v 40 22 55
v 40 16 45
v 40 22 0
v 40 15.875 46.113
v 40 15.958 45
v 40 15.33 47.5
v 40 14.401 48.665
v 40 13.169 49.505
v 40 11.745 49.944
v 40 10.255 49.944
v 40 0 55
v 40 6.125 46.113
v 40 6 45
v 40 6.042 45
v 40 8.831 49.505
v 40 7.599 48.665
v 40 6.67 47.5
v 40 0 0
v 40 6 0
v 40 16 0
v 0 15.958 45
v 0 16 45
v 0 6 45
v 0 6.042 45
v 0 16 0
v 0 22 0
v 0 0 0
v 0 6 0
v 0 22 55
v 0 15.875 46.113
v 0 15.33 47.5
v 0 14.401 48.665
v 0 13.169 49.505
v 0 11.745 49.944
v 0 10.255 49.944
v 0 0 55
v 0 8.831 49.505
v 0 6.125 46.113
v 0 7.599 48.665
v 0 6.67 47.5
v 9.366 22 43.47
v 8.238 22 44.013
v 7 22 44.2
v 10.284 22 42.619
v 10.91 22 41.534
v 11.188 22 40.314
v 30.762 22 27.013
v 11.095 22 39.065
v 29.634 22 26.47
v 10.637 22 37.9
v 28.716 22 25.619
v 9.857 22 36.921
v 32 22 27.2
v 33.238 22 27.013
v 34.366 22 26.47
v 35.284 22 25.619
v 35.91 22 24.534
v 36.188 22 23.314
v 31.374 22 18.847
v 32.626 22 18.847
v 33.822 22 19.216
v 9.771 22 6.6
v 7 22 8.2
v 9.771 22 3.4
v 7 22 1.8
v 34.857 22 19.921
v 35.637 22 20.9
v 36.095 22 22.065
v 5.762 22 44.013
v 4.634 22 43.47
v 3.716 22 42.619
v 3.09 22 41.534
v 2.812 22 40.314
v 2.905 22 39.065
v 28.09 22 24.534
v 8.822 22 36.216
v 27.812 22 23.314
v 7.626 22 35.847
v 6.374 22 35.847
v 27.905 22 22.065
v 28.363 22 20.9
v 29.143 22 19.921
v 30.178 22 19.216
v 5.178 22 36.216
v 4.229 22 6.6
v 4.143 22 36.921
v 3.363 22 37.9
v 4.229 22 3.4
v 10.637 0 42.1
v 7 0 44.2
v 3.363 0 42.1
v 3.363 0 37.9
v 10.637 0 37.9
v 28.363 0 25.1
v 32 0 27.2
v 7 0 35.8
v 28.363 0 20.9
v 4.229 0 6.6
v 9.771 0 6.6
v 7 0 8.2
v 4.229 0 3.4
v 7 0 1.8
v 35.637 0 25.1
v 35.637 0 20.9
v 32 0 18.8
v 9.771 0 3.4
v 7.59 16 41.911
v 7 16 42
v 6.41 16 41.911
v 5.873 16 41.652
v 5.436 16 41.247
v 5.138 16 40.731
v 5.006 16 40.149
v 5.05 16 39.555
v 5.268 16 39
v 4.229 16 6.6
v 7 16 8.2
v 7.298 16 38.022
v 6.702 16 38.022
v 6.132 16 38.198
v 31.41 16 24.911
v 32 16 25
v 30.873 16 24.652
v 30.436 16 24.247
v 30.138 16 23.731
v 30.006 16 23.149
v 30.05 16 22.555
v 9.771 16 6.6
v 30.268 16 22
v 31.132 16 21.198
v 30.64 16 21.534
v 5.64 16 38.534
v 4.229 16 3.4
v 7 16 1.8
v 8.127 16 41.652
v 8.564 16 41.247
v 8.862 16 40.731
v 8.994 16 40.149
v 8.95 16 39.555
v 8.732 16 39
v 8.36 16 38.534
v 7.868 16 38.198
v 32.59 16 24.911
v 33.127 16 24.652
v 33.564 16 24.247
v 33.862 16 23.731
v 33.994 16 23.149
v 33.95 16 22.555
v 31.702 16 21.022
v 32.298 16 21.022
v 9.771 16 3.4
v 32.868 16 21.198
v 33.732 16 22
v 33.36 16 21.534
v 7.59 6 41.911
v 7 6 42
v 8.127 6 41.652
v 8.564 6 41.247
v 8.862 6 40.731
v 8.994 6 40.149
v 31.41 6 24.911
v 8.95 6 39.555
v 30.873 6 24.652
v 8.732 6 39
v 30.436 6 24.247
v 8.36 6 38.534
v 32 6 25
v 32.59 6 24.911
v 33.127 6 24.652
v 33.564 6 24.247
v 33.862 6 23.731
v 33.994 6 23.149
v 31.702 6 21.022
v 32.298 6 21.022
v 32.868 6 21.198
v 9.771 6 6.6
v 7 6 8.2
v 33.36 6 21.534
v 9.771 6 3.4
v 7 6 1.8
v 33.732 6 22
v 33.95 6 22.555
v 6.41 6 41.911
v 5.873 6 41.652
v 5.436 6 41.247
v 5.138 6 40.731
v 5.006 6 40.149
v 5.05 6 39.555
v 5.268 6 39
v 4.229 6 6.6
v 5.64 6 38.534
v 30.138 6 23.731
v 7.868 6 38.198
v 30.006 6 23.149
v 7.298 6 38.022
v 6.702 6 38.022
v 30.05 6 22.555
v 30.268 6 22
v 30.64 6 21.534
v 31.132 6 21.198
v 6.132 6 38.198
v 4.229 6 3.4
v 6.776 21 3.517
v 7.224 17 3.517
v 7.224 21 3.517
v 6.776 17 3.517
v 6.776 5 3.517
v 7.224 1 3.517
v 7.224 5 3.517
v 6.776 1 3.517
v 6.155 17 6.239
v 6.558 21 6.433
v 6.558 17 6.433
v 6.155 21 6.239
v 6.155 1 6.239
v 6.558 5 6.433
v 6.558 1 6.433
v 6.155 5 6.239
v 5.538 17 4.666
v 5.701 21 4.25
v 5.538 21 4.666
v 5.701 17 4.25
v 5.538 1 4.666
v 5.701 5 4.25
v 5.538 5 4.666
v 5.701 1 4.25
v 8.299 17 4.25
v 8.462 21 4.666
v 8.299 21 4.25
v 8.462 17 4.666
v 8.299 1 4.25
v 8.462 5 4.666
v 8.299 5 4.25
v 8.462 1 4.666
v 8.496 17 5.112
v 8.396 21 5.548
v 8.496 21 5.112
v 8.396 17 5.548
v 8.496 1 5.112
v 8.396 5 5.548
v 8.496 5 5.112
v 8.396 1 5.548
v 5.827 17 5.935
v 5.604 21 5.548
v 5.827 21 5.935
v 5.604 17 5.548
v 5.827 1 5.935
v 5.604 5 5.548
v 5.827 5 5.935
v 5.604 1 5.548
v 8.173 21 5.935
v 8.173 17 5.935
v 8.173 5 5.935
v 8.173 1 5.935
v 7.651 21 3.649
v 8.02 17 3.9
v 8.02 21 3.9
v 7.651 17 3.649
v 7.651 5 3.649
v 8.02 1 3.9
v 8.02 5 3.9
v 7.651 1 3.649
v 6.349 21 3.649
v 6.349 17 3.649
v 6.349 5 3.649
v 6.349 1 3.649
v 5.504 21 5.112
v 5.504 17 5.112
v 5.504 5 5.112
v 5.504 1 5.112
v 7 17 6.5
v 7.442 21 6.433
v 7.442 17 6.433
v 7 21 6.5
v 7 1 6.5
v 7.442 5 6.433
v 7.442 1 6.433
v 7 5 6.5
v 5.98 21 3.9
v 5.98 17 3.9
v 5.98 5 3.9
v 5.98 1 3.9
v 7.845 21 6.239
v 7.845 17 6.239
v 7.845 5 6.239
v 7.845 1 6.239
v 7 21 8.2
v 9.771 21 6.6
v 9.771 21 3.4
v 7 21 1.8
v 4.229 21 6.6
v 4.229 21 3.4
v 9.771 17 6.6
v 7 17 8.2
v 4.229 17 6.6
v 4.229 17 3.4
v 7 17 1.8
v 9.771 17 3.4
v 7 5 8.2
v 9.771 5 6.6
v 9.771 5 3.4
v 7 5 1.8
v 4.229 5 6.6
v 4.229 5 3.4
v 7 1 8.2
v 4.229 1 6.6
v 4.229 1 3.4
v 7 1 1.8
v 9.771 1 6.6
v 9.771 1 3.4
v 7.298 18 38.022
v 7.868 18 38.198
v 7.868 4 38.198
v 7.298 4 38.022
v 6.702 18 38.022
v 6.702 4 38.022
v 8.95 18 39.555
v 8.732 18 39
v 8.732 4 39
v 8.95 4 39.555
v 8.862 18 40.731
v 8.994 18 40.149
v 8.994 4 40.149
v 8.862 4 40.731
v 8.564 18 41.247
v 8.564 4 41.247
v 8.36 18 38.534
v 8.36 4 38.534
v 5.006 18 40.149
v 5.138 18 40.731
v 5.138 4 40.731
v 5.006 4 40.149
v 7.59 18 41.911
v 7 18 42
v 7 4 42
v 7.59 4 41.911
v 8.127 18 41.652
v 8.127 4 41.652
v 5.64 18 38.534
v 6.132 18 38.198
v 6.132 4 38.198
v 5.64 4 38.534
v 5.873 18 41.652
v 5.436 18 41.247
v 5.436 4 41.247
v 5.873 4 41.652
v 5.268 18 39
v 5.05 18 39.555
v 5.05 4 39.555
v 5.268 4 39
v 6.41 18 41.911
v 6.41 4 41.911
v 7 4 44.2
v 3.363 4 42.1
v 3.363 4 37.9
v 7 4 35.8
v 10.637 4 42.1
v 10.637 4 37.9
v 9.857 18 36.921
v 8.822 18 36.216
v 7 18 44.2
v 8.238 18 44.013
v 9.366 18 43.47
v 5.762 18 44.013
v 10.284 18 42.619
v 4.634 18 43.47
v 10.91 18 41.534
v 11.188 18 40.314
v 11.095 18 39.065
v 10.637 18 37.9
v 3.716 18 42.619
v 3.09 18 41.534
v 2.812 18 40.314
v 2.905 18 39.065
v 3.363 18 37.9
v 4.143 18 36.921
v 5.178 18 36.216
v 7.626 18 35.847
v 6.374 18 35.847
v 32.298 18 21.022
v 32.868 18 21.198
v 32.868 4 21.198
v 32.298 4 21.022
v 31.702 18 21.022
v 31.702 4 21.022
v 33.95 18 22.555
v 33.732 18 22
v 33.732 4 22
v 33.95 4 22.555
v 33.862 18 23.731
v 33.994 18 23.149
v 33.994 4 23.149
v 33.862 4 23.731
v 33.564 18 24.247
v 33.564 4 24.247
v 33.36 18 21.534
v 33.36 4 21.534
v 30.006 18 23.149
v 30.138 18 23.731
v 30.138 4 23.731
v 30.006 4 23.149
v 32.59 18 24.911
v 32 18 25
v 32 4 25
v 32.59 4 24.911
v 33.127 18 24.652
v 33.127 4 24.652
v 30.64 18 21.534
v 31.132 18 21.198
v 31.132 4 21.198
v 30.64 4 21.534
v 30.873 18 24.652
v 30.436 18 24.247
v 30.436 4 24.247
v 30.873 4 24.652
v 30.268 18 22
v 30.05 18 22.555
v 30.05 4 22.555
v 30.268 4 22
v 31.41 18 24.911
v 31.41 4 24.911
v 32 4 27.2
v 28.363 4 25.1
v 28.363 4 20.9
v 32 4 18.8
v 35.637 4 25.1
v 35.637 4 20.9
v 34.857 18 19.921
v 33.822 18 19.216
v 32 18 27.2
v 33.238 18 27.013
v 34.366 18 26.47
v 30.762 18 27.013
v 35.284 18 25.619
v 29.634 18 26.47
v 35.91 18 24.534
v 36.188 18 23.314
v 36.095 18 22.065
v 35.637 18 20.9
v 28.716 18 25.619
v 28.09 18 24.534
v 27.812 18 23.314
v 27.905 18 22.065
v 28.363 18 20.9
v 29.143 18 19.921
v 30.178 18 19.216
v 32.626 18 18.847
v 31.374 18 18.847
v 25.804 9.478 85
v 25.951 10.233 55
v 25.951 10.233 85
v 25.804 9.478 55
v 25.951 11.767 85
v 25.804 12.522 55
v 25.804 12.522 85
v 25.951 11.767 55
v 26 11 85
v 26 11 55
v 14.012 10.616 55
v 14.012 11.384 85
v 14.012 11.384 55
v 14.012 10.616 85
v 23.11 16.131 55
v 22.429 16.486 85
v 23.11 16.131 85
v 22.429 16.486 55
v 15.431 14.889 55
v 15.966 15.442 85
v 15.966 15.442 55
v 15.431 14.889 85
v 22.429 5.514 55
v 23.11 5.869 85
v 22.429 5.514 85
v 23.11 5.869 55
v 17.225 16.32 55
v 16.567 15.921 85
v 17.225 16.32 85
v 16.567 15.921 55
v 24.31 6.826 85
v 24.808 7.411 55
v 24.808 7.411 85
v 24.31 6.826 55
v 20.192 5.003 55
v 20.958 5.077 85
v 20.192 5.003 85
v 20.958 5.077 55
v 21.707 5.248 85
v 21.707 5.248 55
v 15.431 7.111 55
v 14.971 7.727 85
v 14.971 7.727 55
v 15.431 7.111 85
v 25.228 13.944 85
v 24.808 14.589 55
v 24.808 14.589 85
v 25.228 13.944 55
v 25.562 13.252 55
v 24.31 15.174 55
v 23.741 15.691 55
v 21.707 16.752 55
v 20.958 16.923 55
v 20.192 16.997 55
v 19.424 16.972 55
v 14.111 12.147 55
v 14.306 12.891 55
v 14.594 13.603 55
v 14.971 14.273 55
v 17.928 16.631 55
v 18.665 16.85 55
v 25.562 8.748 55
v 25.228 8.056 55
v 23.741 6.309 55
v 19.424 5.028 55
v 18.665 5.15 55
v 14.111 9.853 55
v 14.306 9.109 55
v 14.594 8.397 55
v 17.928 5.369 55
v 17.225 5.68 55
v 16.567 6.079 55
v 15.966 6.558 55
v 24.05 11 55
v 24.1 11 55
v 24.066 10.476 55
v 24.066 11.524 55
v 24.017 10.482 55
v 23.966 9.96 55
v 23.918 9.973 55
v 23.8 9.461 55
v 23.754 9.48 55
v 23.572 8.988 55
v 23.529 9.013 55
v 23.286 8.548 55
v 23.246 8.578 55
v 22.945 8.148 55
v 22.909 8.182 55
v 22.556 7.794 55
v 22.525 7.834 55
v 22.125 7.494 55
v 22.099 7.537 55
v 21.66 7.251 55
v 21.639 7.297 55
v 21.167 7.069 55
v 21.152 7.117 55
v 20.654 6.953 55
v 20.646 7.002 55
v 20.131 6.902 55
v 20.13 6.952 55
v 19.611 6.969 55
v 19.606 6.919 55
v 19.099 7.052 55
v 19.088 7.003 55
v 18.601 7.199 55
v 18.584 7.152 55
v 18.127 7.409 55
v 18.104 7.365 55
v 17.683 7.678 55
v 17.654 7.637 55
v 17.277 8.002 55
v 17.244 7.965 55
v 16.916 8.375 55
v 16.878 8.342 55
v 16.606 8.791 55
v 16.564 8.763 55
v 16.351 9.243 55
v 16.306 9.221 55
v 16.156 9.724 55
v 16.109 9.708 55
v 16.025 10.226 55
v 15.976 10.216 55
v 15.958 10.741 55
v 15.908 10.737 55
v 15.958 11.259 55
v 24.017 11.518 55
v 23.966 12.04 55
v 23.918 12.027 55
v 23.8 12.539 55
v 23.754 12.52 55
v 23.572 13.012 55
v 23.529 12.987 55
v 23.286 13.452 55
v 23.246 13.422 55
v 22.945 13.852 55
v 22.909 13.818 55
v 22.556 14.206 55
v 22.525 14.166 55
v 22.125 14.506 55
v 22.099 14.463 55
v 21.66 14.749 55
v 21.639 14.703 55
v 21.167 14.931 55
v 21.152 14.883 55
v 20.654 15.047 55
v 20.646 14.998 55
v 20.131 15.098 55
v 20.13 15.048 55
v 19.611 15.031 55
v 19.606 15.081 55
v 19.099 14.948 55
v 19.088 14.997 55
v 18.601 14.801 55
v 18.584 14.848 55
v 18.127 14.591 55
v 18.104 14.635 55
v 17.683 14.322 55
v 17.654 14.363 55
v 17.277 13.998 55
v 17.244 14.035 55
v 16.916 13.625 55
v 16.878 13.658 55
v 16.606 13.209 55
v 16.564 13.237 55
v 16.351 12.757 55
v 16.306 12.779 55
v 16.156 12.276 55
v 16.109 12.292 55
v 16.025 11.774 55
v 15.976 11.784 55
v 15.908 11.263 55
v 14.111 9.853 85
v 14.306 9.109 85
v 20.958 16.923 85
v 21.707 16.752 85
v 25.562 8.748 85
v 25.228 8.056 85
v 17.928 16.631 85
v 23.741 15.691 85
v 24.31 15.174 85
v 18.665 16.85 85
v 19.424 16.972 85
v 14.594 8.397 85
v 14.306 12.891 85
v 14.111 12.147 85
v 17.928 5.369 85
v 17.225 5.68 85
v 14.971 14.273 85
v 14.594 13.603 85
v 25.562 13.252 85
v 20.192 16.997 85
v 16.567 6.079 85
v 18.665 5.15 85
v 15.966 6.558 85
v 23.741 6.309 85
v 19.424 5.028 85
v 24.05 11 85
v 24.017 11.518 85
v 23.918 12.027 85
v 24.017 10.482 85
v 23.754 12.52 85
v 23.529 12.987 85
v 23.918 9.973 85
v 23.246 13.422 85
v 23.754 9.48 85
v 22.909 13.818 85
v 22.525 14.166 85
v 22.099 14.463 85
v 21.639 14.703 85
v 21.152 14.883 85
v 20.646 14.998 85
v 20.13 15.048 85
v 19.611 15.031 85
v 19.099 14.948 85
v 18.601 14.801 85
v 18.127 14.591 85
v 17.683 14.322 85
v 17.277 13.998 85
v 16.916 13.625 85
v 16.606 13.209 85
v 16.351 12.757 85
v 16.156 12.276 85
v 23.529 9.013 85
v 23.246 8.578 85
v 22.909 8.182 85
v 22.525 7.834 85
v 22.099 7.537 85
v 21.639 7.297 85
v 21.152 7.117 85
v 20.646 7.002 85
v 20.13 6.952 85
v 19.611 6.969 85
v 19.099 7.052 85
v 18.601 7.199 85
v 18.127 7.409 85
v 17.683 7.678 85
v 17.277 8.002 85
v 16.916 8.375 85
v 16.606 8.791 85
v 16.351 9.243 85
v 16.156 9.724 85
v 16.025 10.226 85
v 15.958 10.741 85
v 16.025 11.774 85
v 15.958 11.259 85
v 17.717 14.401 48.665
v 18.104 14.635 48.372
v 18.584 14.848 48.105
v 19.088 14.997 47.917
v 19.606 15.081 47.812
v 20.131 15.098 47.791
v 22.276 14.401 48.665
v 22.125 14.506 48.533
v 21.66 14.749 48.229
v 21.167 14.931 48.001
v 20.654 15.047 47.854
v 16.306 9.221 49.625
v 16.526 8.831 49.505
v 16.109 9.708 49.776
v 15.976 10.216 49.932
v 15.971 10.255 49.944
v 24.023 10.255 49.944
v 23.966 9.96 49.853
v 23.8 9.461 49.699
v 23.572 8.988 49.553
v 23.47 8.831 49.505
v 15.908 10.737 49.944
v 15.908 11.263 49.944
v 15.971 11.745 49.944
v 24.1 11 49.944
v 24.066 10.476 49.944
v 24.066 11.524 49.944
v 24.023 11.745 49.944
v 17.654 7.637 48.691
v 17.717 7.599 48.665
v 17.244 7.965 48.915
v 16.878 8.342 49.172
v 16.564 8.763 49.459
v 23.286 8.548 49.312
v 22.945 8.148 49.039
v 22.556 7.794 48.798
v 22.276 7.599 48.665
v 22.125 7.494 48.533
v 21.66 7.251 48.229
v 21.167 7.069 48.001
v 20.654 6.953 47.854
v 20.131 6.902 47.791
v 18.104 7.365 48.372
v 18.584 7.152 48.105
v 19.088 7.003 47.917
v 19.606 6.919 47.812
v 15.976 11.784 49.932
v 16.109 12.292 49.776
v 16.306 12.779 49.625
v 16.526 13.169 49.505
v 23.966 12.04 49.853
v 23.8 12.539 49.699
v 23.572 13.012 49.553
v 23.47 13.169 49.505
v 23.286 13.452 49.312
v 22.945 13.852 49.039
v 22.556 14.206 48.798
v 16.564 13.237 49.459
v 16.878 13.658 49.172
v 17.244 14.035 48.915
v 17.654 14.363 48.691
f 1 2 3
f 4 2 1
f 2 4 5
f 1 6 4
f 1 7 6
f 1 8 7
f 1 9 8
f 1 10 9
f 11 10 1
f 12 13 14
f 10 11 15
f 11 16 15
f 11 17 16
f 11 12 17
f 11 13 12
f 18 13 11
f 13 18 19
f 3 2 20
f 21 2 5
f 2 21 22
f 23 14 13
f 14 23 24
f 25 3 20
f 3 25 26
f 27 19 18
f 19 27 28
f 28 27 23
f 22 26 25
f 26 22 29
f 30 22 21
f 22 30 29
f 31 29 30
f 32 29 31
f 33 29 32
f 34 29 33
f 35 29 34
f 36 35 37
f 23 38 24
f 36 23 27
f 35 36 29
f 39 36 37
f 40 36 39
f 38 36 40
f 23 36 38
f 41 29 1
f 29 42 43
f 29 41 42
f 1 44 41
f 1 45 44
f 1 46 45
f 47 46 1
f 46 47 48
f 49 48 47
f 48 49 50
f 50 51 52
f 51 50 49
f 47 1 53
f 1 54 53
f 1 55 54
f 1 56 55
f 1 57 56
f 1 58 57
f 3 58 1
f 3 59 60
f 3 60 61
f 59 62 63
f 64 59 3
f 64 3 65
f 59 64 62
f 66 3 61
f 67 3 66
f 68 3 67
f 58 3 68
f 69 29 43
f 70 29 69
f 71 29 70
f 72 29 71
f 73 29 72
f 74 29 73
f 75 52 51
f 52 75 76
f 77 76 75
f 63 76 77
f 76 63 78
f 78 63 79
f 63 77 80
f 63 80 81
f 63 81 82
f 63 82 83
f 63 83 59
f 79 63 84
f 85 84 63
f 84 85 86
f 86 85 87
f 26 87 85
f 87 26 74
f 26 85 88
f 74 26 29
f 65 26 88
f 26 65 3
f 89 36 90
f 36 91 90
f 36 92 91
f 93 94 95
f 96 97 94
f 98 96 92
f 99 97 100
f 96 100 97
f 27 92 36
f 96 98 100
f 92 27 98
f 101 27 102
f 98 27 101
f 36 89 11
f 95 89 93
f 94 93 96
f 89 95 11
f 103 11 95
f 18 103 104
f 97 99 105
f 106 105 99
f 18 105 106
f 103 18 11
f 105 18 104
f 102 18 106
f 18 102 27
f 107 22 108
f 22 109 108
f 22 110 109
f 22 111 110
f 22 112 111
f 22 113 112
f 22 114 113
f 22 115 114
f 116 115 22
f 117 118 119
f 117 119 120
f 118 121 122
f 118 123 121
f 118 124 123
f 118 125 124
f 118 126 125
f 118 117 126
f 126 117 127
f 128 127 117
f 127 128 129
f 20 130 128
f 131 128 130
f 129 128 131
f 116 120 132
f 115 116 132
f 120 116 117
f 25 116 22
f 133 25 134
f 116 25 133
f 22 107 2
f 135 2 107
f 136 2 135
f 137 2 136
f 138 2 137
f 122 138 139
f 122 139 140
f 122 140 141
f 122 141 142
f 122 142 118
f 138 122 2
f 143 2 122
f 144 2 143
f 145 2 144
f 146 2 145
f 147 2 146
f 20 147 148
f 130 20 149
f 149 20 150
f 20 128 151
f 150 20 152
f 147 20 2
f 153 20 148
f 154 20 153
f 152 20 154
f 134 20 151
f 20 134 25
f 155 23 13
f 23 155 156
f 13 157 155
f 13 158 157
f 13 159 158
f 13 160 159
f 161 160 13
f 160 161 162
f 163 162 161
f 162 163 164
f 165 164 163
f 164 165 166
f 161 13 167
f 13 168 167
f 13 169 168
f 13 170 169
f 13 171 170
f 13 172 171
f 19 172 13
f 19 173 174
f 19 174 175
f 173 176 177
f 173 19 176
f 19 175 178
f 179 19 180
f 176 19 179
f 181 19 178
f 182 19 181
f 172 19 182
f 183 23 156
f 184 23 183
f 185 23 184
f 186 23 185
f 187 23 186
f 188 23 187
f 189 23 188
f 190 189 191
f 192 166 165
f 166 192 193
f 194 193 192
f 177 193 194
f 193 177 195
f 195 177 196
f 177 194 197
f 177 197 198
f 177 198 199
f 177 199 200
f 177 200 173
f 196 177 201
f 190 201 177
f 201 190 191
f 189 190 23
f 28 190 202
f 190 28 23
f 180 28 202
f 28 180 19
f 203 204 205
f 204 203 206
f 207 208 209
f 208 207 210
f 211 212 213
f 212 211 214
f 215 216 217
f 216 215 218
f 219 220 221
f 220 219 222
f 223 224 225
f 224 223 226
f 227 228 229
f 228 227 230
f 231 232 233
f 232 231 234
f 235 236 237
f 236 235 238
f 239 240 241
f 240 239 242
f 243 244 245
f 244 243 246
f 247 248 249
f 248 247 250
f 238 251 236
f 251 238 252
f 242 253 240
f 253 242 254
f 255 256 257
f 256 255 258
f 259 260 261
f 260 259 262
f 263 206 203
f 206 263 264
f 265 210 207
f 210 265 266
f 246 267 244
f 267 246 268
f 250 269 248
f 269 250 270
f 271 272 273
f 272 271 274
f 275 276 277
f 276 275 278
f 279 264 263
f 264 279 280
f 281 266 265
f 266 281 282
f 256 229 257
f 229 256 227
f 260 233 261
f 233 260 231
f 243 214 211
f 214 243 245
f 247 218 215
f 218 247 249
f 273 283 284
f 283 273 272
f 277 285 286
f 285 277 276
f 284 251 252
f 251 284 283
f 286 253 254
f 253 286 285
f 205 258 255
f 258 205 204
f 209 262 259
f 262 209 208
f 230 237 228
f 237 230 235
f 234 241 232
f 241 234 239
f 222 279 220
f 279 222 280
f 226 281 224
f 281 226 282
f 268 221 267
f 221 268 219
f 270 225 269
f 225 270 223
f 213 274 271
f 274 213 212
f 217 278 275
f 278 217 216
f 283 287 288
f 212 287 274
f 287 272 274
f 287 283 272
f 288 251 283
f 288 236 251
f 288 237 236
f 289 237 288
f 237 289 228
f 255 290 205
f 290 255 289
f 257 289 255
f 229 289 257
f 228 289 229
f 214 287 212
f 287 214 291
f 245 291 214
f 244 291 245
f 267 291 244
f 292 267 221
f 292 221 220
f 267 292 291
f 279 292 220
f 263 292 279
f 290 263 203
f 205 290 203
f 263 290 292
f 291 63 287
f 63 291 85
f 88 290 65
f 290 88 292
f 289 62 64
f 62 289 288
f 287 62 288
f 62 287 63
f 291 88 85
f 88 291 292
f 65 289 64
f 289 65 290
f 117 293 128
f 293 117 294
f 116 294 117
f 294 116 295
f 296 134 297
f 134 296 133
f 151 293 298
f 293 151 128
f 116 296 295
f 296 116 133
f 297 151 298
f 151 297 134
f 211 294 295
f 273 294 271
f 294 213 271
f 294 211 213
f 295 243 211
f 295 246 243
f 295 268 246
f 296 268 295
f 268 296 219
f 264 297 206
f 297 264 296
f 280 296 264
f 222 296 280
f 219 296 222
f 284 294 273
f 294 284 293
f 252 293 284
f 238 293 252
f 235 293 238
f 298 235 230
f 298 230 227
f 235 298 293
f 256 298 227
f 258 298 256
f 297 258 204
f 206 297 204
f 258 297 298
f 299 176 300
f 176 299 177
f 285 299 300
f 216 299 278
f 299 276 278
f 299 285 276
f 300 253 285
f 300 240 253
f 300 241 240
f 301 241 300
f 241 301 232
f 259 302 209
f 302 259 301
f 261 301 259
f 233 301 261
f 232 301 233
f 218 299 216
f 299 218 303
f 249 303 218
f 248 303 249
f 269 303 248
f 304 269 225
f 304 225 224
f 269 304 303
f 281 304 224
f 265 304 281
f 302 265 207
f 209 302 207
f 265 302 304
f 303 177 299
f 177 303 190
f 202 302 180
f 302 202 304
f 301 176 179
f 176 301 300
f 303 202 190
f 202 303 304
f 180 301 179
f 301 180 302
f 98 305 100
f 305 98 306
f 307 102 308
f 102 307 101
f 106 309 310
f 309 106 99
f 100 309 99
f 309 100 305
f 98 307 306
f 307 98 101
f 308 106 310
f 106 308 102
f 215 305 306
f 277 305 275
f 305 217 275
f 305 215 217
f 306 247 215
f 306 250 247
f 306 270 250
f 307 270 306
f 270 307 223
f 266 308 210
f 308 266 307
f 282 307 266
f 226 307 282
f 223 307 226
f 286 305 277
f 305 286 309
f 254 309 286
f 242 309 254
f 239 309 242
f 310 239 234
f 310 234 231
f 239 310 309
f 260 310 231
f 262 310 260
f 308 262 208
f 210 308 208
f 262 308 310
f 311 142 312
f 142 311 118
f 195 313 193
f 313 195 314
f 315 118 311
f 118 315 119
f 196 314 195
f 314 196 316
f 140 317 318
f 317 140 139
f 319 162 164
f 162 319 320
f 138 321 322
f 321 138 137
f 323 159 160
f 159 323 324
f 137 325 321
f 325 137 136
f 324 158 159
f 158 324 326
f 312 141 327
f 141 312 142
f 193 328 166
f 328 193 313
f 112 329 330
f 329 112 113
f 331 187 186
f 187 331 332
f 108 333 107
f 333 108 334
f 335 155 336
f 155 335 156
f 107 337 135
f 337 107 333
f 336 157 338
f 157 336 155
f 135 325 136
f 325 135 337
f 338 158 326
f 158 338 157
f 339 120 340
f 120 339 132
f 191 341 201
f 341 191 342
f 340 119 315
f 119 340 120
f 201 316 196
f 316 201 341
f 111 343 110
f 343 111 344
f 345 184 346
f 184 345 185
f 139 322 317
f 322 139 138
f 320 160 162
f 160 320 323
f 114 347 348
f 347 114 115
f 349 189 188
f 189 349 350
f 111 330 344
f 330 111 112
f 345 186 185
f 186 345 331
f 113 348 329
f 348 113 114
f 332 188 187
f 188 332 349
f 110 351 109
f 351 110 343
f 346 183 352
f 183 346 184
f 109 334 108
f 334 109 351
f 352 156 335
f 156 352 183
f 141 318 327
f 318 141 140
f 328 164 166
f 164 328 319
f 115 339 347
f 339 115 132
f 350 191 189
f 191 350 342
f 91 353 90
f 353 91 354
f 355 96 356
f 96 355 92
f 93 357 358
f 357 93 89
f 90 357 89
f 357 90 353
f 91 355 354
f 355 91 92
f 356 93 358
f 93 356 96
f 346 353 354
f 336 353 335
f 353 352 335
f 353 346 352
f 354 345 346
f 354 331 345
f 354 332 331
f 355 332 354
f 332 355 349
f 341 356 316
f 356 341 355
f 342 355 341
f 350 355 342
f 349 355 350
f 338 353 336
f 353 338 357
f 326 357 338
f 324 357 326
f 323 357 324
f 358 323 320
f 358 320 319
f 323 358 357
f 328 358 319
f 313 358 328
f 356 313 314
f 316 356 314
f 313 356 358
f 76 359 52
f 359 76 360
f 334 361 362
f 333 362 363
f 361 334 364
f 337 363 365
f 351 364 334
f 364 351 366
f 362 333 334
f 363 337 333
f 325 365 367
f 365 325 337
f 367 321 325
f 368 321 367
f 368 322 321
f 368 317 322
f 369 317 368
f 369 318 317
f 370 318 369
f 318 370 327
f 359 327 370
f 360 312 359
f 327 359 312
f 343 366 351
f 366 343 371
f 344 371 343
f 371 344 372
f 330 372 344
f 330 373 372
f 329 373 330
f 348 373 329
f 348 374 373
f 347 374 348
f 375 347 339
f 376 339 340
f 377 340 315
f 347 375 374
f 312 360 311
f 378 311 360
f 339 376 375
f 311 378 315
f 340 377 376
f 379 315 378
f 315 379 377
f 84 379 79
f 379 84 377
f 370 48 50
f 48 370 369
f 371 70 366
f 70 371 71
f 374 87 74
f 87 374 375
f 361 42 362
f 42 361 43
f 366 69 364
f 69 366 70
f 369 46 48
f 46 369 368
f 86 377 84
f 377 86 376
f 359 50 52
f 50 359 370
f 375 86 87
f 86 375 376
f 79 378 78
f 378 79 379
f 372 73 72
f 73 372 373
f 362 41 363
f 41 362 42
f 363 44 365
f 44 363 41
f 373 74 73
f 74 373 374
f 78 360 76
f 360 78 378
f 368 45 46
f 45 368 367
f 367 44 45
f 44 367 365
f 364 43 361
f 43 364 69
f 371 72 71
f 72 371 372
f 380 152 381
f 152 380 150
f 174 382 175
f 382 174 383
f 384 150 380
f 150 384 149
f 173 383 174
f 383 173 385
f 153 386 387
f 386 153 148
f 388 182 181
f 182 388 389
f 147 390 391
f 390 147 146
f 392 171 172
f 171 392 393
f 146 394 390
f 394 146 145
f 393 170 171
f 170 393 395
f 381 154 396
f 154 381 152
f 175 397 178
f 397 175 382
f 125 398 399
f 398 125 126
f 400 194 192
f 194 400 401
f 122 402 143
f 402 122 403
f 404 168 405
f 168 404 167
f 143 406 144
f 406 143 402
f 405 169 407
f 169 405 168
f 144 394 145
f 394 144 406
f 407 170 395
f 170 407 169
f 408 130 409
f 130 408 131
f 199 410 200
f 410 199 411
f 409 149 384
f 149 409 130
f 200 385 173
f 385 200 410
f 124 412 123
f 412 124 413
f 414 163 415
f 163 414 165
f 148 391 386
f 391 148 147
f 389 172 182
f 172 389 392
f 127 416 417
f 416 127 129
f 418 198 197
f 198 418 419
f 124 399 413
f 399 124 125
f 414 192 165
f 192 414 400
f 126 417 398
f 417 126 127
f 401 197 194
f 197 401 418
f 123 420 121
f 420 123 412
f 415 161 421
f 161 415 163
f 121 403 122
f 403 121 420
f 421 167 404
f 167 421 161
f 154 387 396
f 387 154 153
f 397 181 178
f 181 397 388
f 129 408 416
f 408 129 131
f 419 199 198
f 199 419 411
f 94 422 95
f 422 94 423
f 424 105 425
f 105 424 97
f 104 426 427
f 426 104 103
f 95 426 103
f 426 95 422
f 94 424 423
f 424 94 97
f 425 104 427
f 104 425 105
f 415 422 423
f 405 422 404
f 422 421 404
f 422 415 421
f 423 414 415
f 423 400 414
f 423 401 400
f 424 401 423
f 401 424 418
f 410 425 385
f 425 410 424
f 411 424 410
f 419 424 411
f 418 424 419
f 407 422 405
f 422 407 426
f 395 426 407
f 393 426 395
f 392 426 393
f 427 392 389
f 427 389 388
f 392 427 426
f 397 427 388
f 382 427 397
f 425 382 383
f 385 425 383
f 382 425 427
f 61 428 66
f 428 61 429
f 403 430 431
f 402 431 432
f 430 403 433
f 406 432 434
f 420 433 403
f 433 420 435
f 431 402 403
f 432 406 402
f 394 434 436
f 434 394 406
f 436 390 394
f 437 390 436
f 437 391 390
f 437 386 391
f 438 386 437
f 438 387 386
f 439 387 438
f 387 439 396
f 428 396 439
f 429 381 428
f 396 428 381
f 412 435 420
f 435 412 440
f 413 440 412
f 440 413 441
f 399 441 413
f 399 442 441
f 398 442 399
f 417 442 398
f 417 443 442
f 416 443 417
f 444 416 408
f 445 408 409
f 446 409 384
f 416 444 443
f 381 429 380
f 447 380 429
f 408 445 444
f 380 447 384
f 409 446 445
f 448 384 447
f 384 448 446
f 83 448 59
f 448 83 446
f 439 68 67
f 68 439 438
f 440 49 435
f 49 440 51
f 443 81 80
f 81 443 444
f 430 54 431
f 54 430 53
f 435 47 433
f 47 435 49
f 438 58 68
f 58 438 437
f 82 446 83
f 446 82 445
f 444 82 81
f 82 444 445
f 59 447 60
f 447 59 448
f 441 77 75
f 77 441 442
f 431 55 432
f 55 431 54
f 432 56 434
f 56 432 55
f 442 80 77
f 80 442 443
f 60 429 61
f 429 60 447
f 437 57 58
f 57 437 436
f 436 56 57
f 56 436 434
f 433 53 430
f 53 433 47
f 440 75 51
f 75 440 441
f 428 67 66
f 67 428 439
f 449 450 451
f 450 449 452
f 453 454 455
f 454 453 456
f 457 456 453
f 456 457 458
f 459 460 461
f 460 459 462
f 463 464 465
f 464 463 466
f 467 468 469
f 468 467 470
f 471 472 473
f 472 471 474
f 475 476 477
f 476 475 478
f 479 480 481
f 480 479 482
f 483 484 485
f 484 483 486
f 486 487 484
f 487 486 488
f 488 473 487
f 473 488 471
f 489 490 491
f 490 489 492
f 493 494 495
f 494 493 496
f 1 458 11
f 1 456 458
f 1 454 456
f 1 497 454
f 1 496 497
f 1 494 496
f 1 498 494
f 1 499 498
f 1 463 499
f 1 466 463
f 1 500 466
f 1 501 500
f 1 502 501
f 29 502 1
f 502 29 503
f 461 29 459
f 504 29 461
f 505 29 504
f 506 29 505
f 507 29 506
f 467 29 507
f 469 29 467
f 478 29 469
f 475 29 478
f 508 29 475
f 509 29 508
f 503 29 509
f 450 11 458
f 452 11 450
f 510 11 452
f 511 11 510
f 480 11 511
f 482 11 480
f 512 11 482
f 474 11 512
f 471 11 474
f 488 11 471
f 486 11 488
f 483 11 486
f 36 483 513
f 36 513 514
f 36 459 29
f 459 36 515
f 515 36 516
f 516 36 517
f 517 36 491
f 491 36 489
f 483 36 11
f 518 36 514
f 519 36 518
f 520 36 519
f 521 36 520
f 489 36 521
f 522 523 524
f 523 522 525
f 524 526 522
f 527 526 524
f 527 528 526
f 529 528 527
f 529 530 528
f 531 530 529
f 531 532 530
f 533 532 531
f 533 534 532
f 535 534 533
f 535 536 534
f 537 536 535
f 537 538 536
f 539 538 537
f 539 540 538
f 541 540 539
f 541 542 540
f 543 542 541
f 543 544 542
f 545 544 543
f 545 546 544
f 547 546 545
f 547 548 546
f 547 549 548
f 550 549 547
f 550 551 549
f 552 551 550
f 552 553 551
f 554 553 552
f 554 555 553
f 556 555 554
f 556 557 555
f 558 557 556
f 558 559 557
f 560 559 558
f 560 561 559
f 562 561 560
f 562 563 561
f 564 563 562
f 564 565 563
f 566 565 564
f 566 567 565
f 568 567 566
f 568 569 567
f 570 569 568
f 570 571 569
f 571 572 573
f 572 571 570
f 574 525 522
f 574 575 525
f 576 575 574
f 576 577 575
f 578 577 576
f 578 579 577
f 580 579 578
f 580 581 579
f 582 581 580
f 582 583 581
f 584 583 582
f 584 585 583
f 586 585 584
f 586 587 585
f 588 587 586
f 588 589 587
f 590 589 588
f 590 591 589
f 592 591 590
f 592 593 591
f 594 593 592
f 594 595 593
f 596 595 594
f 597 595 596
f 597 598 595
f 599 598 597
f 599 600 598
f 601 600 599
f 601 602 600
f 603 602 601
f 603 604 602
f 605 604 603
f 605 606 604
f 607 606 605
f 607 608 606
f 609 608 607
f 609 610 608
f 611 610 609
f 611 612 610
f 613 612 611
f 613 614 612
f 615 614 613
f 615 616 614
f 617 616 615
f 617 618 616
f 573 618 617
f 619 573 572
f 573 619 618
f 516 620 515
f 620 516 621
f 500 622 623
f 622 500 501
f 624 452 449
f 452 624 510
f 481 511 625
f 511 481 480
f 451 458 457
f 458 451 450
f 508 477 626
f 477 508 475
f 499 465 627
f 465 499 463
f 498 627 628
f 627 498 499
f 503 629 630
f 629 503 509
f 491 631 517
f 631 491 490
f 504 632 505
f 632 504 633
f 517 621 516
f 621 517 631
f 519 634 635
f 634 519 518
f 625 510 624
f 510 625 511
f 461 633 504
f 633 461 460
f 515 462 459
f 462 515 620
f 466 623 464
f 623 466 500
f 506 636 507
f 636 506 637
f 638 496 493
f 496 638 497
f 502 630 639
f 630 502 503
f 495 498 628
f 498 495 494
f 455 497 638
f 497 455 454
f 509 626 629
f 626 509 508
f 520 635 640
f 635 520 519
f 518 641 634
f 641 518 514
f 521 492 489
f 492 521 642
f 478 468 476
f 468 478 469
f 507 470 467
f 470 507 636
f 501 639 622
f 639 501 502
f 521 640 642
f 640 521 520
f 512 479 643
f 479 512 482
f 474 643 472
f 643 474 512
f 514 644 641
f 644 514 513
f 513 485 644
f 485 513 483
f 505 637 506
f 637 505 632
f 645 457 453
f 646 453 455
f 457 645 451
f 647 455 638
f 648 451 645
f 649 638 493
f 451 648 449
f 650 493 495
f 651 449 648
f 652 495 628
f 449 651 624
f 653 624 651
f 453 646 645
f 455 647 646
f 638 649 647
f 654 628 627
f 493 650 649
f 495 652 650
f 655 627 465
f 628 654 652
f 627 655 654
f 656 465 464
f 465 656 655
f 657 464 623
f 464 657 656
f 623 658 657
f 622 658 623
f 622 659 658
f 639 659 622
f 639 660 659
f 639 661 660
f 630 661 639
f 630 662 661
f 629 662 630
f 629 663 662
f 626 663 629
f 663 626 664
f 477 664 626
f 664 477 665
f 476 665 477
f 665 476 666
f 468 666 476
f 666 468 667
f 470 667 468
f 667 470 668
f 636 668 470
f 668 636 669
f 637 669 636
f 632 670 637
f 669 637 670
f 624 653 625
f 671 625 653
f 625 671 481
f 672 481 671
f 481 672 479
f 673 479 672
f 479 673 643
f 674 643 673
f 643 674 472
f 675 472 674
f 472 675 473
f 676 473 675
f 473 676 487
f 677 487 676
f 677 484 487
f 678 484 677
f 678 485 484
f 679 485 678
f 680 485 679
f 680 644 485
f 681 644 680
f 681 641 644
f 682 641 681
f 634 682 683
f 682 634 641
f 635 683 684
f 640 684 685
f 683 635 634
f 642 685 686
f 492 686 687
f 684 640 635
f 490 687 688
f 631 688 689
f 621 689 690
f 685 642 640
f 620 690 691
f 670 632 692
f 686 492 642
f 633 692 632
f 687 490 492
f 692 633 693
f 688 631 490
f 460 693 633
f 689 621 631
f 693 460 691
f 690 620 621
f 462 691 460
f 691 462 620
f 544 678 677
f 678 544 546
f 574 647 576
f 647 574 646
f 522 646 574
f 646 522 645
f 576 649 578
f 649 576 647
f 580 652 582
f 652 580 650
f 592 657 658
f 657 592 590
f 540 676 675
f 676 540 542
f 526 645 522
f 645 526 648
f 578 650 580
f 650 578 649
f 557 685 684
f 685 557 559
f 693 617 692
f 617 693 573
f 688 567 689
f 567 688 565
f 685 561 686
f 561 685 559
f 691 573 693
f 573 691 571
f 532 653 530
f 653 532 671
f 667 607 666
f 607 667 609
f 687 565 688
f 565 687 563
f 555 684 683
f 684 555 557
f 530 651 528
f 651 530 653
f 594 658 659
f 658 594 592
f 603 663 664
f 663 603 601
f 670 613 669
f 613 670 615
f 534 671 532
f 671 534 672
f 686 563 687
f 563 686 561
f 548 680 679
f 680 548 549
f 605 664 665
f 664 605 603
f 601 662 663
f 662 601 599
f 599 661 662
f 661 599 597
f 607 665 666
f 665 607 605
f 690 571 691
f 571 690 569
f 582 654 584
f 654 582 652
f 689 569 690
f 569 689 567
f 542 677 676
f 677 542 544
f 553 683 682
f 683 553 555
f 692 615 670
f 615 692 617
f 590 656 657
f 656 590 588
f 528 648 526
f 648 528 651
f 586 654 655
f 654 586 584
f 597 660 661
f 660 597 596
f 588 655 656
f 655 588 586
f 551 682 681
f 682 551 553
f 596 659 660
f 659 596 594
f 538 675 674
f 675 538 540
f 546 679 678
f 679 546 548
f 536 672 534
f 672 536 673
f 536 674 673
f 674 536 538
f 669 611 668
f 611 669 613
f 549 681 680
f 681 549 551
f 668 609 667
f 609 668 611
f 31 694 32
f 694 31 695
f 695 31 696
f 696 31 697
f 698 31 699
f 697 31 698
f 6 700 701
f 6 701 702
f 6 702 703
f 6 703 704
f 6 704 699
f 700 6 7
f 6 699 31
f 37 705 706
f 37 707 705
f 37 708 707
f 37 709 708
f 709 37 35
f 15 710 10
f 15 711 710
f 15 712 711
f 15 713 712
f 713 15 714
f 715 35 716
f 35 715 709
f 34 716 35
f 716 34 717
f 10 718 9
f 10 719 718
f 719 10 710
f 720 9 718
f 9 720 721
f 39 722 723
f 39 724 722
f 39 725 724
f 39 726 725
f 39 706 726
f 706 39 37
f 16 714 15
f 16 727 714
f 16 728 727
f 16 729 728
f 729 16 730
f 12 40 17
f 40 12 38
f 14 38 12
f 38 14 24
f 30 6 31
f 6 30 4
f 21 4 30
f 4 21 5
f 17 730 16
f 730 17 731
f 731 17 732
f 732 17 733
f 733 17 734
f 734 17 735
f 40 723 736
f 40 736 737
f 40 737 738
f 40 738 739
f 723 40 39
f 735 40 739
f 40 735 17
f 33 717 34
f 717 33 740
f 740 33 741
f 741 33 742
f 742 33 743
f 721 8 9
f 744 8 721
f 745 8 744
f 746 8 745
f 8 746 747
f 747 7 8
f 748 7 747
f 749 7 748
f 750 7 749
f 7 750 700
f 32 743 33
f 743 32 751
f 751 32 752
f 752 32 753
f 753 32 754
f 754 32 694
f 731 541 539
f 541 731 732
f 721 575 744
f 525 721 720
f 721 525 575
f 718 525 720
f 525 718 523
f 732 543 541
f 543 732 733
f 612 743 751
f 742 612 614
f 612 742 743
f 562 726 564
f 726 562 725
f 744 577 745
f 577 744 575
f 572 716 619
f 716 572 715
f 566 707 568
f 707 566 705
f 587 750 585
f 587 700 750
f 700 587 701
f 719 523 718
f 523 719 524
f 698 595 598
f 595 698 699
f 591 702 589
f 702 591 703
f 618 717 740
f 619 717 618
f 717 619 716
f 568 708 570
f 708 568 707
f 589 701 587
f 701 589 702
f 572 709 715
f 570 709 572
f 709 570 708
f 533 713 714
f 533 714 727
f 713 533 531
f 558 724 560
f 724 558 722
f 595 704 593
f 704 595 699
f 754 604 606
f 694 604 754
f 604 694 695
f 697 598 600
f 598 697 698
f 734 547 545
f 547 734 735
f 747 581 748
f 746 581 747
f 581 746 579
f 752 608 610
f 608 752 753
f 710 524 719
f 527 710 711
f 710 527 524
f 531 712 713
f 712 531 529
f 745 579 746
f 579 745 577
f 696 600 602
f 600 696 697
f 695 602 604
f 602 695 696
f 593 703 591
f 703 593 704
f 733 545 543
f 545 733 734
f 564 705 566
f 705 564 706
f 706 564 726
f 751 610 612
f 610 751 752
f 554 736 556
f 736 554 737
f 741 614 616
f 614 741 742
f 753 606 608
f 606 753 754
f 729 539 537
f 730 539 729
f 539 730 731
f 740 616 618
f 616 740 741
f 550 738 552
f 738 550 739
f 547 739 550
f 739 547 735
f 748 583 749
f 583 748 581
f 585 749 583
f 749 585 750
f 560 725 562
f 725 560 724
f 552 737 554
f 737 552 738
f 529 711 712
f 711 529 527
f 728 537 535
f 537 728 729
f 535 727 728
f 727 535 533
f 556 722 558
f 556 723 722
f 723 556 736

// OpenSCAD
union()
{
	difference()
	{
		cube([40,22,45]);
		translate([0,6,0])
		cube([40,22-12,45]);
		translate([7,22+6,5])
		rotate([90,30,0])
		cylinder(d=3,h=34,$fn=21);
	
		translate([7,22,5])
		rotate([90,30,0])
		cylinder(d=6.4,h=1,$fn=6);
	
		translate([7,17,5])
		rotate([90,30,0])
		cylinder(d=6.4,h=1,$fn=6);
	
		translate([7,6,5])
		rotate([90,30,0])
		cylinder(d=6.4,h=1,$fn=6);
	
		translate([7,1,5])
		rotate([90,30,0])
		cylinder(d=6.4,h=1,$fn=6);
	
		// --------
		
		translate([7,22,40])
		rotate([90,30,0])
		cylinder(d=4,h=34,$fn=21);
	
		translate([7,4,40])
		rotate([90,30,0])
		cylinder(d=8.4,h=4,$fn=6);
	
		translate([7,22,40])
		rotate([90,30,0])
		cylinder(d=8.4,h=4,$fn=21);
	
		// --------
		
		translate([32,22,23])
		rotate([90,30,0])
		cylinder(d=4,h=34,$fn=21);
	
		translate([32,4,23])
		rotate([90,30,0])
		cylinder(d=8.4,h=4,$fn=6);
	
		translate([32,22,23])
		rotate([90,30,0])
		cylinder(d=8.4,h=4,$fn=21);
	}
	
	difference()
	{
		translate([20,11,55])
		cylinder(d=12,h=30,$fn=49);
		translate([20,11,45])
		cylinder(d=8.1,h=40,$fn=49);
	}	

	difference()
	{
		translate([0,0,45])
		cube([40,22,10]);
		translate([0,11,45])
		rotate([0,90,0])
		cylinder(d=10,h=40,$fn=21);
		translate([20,11,45])
		cylinder(d=8.2,h=40,$fn=49);
	}
}	
